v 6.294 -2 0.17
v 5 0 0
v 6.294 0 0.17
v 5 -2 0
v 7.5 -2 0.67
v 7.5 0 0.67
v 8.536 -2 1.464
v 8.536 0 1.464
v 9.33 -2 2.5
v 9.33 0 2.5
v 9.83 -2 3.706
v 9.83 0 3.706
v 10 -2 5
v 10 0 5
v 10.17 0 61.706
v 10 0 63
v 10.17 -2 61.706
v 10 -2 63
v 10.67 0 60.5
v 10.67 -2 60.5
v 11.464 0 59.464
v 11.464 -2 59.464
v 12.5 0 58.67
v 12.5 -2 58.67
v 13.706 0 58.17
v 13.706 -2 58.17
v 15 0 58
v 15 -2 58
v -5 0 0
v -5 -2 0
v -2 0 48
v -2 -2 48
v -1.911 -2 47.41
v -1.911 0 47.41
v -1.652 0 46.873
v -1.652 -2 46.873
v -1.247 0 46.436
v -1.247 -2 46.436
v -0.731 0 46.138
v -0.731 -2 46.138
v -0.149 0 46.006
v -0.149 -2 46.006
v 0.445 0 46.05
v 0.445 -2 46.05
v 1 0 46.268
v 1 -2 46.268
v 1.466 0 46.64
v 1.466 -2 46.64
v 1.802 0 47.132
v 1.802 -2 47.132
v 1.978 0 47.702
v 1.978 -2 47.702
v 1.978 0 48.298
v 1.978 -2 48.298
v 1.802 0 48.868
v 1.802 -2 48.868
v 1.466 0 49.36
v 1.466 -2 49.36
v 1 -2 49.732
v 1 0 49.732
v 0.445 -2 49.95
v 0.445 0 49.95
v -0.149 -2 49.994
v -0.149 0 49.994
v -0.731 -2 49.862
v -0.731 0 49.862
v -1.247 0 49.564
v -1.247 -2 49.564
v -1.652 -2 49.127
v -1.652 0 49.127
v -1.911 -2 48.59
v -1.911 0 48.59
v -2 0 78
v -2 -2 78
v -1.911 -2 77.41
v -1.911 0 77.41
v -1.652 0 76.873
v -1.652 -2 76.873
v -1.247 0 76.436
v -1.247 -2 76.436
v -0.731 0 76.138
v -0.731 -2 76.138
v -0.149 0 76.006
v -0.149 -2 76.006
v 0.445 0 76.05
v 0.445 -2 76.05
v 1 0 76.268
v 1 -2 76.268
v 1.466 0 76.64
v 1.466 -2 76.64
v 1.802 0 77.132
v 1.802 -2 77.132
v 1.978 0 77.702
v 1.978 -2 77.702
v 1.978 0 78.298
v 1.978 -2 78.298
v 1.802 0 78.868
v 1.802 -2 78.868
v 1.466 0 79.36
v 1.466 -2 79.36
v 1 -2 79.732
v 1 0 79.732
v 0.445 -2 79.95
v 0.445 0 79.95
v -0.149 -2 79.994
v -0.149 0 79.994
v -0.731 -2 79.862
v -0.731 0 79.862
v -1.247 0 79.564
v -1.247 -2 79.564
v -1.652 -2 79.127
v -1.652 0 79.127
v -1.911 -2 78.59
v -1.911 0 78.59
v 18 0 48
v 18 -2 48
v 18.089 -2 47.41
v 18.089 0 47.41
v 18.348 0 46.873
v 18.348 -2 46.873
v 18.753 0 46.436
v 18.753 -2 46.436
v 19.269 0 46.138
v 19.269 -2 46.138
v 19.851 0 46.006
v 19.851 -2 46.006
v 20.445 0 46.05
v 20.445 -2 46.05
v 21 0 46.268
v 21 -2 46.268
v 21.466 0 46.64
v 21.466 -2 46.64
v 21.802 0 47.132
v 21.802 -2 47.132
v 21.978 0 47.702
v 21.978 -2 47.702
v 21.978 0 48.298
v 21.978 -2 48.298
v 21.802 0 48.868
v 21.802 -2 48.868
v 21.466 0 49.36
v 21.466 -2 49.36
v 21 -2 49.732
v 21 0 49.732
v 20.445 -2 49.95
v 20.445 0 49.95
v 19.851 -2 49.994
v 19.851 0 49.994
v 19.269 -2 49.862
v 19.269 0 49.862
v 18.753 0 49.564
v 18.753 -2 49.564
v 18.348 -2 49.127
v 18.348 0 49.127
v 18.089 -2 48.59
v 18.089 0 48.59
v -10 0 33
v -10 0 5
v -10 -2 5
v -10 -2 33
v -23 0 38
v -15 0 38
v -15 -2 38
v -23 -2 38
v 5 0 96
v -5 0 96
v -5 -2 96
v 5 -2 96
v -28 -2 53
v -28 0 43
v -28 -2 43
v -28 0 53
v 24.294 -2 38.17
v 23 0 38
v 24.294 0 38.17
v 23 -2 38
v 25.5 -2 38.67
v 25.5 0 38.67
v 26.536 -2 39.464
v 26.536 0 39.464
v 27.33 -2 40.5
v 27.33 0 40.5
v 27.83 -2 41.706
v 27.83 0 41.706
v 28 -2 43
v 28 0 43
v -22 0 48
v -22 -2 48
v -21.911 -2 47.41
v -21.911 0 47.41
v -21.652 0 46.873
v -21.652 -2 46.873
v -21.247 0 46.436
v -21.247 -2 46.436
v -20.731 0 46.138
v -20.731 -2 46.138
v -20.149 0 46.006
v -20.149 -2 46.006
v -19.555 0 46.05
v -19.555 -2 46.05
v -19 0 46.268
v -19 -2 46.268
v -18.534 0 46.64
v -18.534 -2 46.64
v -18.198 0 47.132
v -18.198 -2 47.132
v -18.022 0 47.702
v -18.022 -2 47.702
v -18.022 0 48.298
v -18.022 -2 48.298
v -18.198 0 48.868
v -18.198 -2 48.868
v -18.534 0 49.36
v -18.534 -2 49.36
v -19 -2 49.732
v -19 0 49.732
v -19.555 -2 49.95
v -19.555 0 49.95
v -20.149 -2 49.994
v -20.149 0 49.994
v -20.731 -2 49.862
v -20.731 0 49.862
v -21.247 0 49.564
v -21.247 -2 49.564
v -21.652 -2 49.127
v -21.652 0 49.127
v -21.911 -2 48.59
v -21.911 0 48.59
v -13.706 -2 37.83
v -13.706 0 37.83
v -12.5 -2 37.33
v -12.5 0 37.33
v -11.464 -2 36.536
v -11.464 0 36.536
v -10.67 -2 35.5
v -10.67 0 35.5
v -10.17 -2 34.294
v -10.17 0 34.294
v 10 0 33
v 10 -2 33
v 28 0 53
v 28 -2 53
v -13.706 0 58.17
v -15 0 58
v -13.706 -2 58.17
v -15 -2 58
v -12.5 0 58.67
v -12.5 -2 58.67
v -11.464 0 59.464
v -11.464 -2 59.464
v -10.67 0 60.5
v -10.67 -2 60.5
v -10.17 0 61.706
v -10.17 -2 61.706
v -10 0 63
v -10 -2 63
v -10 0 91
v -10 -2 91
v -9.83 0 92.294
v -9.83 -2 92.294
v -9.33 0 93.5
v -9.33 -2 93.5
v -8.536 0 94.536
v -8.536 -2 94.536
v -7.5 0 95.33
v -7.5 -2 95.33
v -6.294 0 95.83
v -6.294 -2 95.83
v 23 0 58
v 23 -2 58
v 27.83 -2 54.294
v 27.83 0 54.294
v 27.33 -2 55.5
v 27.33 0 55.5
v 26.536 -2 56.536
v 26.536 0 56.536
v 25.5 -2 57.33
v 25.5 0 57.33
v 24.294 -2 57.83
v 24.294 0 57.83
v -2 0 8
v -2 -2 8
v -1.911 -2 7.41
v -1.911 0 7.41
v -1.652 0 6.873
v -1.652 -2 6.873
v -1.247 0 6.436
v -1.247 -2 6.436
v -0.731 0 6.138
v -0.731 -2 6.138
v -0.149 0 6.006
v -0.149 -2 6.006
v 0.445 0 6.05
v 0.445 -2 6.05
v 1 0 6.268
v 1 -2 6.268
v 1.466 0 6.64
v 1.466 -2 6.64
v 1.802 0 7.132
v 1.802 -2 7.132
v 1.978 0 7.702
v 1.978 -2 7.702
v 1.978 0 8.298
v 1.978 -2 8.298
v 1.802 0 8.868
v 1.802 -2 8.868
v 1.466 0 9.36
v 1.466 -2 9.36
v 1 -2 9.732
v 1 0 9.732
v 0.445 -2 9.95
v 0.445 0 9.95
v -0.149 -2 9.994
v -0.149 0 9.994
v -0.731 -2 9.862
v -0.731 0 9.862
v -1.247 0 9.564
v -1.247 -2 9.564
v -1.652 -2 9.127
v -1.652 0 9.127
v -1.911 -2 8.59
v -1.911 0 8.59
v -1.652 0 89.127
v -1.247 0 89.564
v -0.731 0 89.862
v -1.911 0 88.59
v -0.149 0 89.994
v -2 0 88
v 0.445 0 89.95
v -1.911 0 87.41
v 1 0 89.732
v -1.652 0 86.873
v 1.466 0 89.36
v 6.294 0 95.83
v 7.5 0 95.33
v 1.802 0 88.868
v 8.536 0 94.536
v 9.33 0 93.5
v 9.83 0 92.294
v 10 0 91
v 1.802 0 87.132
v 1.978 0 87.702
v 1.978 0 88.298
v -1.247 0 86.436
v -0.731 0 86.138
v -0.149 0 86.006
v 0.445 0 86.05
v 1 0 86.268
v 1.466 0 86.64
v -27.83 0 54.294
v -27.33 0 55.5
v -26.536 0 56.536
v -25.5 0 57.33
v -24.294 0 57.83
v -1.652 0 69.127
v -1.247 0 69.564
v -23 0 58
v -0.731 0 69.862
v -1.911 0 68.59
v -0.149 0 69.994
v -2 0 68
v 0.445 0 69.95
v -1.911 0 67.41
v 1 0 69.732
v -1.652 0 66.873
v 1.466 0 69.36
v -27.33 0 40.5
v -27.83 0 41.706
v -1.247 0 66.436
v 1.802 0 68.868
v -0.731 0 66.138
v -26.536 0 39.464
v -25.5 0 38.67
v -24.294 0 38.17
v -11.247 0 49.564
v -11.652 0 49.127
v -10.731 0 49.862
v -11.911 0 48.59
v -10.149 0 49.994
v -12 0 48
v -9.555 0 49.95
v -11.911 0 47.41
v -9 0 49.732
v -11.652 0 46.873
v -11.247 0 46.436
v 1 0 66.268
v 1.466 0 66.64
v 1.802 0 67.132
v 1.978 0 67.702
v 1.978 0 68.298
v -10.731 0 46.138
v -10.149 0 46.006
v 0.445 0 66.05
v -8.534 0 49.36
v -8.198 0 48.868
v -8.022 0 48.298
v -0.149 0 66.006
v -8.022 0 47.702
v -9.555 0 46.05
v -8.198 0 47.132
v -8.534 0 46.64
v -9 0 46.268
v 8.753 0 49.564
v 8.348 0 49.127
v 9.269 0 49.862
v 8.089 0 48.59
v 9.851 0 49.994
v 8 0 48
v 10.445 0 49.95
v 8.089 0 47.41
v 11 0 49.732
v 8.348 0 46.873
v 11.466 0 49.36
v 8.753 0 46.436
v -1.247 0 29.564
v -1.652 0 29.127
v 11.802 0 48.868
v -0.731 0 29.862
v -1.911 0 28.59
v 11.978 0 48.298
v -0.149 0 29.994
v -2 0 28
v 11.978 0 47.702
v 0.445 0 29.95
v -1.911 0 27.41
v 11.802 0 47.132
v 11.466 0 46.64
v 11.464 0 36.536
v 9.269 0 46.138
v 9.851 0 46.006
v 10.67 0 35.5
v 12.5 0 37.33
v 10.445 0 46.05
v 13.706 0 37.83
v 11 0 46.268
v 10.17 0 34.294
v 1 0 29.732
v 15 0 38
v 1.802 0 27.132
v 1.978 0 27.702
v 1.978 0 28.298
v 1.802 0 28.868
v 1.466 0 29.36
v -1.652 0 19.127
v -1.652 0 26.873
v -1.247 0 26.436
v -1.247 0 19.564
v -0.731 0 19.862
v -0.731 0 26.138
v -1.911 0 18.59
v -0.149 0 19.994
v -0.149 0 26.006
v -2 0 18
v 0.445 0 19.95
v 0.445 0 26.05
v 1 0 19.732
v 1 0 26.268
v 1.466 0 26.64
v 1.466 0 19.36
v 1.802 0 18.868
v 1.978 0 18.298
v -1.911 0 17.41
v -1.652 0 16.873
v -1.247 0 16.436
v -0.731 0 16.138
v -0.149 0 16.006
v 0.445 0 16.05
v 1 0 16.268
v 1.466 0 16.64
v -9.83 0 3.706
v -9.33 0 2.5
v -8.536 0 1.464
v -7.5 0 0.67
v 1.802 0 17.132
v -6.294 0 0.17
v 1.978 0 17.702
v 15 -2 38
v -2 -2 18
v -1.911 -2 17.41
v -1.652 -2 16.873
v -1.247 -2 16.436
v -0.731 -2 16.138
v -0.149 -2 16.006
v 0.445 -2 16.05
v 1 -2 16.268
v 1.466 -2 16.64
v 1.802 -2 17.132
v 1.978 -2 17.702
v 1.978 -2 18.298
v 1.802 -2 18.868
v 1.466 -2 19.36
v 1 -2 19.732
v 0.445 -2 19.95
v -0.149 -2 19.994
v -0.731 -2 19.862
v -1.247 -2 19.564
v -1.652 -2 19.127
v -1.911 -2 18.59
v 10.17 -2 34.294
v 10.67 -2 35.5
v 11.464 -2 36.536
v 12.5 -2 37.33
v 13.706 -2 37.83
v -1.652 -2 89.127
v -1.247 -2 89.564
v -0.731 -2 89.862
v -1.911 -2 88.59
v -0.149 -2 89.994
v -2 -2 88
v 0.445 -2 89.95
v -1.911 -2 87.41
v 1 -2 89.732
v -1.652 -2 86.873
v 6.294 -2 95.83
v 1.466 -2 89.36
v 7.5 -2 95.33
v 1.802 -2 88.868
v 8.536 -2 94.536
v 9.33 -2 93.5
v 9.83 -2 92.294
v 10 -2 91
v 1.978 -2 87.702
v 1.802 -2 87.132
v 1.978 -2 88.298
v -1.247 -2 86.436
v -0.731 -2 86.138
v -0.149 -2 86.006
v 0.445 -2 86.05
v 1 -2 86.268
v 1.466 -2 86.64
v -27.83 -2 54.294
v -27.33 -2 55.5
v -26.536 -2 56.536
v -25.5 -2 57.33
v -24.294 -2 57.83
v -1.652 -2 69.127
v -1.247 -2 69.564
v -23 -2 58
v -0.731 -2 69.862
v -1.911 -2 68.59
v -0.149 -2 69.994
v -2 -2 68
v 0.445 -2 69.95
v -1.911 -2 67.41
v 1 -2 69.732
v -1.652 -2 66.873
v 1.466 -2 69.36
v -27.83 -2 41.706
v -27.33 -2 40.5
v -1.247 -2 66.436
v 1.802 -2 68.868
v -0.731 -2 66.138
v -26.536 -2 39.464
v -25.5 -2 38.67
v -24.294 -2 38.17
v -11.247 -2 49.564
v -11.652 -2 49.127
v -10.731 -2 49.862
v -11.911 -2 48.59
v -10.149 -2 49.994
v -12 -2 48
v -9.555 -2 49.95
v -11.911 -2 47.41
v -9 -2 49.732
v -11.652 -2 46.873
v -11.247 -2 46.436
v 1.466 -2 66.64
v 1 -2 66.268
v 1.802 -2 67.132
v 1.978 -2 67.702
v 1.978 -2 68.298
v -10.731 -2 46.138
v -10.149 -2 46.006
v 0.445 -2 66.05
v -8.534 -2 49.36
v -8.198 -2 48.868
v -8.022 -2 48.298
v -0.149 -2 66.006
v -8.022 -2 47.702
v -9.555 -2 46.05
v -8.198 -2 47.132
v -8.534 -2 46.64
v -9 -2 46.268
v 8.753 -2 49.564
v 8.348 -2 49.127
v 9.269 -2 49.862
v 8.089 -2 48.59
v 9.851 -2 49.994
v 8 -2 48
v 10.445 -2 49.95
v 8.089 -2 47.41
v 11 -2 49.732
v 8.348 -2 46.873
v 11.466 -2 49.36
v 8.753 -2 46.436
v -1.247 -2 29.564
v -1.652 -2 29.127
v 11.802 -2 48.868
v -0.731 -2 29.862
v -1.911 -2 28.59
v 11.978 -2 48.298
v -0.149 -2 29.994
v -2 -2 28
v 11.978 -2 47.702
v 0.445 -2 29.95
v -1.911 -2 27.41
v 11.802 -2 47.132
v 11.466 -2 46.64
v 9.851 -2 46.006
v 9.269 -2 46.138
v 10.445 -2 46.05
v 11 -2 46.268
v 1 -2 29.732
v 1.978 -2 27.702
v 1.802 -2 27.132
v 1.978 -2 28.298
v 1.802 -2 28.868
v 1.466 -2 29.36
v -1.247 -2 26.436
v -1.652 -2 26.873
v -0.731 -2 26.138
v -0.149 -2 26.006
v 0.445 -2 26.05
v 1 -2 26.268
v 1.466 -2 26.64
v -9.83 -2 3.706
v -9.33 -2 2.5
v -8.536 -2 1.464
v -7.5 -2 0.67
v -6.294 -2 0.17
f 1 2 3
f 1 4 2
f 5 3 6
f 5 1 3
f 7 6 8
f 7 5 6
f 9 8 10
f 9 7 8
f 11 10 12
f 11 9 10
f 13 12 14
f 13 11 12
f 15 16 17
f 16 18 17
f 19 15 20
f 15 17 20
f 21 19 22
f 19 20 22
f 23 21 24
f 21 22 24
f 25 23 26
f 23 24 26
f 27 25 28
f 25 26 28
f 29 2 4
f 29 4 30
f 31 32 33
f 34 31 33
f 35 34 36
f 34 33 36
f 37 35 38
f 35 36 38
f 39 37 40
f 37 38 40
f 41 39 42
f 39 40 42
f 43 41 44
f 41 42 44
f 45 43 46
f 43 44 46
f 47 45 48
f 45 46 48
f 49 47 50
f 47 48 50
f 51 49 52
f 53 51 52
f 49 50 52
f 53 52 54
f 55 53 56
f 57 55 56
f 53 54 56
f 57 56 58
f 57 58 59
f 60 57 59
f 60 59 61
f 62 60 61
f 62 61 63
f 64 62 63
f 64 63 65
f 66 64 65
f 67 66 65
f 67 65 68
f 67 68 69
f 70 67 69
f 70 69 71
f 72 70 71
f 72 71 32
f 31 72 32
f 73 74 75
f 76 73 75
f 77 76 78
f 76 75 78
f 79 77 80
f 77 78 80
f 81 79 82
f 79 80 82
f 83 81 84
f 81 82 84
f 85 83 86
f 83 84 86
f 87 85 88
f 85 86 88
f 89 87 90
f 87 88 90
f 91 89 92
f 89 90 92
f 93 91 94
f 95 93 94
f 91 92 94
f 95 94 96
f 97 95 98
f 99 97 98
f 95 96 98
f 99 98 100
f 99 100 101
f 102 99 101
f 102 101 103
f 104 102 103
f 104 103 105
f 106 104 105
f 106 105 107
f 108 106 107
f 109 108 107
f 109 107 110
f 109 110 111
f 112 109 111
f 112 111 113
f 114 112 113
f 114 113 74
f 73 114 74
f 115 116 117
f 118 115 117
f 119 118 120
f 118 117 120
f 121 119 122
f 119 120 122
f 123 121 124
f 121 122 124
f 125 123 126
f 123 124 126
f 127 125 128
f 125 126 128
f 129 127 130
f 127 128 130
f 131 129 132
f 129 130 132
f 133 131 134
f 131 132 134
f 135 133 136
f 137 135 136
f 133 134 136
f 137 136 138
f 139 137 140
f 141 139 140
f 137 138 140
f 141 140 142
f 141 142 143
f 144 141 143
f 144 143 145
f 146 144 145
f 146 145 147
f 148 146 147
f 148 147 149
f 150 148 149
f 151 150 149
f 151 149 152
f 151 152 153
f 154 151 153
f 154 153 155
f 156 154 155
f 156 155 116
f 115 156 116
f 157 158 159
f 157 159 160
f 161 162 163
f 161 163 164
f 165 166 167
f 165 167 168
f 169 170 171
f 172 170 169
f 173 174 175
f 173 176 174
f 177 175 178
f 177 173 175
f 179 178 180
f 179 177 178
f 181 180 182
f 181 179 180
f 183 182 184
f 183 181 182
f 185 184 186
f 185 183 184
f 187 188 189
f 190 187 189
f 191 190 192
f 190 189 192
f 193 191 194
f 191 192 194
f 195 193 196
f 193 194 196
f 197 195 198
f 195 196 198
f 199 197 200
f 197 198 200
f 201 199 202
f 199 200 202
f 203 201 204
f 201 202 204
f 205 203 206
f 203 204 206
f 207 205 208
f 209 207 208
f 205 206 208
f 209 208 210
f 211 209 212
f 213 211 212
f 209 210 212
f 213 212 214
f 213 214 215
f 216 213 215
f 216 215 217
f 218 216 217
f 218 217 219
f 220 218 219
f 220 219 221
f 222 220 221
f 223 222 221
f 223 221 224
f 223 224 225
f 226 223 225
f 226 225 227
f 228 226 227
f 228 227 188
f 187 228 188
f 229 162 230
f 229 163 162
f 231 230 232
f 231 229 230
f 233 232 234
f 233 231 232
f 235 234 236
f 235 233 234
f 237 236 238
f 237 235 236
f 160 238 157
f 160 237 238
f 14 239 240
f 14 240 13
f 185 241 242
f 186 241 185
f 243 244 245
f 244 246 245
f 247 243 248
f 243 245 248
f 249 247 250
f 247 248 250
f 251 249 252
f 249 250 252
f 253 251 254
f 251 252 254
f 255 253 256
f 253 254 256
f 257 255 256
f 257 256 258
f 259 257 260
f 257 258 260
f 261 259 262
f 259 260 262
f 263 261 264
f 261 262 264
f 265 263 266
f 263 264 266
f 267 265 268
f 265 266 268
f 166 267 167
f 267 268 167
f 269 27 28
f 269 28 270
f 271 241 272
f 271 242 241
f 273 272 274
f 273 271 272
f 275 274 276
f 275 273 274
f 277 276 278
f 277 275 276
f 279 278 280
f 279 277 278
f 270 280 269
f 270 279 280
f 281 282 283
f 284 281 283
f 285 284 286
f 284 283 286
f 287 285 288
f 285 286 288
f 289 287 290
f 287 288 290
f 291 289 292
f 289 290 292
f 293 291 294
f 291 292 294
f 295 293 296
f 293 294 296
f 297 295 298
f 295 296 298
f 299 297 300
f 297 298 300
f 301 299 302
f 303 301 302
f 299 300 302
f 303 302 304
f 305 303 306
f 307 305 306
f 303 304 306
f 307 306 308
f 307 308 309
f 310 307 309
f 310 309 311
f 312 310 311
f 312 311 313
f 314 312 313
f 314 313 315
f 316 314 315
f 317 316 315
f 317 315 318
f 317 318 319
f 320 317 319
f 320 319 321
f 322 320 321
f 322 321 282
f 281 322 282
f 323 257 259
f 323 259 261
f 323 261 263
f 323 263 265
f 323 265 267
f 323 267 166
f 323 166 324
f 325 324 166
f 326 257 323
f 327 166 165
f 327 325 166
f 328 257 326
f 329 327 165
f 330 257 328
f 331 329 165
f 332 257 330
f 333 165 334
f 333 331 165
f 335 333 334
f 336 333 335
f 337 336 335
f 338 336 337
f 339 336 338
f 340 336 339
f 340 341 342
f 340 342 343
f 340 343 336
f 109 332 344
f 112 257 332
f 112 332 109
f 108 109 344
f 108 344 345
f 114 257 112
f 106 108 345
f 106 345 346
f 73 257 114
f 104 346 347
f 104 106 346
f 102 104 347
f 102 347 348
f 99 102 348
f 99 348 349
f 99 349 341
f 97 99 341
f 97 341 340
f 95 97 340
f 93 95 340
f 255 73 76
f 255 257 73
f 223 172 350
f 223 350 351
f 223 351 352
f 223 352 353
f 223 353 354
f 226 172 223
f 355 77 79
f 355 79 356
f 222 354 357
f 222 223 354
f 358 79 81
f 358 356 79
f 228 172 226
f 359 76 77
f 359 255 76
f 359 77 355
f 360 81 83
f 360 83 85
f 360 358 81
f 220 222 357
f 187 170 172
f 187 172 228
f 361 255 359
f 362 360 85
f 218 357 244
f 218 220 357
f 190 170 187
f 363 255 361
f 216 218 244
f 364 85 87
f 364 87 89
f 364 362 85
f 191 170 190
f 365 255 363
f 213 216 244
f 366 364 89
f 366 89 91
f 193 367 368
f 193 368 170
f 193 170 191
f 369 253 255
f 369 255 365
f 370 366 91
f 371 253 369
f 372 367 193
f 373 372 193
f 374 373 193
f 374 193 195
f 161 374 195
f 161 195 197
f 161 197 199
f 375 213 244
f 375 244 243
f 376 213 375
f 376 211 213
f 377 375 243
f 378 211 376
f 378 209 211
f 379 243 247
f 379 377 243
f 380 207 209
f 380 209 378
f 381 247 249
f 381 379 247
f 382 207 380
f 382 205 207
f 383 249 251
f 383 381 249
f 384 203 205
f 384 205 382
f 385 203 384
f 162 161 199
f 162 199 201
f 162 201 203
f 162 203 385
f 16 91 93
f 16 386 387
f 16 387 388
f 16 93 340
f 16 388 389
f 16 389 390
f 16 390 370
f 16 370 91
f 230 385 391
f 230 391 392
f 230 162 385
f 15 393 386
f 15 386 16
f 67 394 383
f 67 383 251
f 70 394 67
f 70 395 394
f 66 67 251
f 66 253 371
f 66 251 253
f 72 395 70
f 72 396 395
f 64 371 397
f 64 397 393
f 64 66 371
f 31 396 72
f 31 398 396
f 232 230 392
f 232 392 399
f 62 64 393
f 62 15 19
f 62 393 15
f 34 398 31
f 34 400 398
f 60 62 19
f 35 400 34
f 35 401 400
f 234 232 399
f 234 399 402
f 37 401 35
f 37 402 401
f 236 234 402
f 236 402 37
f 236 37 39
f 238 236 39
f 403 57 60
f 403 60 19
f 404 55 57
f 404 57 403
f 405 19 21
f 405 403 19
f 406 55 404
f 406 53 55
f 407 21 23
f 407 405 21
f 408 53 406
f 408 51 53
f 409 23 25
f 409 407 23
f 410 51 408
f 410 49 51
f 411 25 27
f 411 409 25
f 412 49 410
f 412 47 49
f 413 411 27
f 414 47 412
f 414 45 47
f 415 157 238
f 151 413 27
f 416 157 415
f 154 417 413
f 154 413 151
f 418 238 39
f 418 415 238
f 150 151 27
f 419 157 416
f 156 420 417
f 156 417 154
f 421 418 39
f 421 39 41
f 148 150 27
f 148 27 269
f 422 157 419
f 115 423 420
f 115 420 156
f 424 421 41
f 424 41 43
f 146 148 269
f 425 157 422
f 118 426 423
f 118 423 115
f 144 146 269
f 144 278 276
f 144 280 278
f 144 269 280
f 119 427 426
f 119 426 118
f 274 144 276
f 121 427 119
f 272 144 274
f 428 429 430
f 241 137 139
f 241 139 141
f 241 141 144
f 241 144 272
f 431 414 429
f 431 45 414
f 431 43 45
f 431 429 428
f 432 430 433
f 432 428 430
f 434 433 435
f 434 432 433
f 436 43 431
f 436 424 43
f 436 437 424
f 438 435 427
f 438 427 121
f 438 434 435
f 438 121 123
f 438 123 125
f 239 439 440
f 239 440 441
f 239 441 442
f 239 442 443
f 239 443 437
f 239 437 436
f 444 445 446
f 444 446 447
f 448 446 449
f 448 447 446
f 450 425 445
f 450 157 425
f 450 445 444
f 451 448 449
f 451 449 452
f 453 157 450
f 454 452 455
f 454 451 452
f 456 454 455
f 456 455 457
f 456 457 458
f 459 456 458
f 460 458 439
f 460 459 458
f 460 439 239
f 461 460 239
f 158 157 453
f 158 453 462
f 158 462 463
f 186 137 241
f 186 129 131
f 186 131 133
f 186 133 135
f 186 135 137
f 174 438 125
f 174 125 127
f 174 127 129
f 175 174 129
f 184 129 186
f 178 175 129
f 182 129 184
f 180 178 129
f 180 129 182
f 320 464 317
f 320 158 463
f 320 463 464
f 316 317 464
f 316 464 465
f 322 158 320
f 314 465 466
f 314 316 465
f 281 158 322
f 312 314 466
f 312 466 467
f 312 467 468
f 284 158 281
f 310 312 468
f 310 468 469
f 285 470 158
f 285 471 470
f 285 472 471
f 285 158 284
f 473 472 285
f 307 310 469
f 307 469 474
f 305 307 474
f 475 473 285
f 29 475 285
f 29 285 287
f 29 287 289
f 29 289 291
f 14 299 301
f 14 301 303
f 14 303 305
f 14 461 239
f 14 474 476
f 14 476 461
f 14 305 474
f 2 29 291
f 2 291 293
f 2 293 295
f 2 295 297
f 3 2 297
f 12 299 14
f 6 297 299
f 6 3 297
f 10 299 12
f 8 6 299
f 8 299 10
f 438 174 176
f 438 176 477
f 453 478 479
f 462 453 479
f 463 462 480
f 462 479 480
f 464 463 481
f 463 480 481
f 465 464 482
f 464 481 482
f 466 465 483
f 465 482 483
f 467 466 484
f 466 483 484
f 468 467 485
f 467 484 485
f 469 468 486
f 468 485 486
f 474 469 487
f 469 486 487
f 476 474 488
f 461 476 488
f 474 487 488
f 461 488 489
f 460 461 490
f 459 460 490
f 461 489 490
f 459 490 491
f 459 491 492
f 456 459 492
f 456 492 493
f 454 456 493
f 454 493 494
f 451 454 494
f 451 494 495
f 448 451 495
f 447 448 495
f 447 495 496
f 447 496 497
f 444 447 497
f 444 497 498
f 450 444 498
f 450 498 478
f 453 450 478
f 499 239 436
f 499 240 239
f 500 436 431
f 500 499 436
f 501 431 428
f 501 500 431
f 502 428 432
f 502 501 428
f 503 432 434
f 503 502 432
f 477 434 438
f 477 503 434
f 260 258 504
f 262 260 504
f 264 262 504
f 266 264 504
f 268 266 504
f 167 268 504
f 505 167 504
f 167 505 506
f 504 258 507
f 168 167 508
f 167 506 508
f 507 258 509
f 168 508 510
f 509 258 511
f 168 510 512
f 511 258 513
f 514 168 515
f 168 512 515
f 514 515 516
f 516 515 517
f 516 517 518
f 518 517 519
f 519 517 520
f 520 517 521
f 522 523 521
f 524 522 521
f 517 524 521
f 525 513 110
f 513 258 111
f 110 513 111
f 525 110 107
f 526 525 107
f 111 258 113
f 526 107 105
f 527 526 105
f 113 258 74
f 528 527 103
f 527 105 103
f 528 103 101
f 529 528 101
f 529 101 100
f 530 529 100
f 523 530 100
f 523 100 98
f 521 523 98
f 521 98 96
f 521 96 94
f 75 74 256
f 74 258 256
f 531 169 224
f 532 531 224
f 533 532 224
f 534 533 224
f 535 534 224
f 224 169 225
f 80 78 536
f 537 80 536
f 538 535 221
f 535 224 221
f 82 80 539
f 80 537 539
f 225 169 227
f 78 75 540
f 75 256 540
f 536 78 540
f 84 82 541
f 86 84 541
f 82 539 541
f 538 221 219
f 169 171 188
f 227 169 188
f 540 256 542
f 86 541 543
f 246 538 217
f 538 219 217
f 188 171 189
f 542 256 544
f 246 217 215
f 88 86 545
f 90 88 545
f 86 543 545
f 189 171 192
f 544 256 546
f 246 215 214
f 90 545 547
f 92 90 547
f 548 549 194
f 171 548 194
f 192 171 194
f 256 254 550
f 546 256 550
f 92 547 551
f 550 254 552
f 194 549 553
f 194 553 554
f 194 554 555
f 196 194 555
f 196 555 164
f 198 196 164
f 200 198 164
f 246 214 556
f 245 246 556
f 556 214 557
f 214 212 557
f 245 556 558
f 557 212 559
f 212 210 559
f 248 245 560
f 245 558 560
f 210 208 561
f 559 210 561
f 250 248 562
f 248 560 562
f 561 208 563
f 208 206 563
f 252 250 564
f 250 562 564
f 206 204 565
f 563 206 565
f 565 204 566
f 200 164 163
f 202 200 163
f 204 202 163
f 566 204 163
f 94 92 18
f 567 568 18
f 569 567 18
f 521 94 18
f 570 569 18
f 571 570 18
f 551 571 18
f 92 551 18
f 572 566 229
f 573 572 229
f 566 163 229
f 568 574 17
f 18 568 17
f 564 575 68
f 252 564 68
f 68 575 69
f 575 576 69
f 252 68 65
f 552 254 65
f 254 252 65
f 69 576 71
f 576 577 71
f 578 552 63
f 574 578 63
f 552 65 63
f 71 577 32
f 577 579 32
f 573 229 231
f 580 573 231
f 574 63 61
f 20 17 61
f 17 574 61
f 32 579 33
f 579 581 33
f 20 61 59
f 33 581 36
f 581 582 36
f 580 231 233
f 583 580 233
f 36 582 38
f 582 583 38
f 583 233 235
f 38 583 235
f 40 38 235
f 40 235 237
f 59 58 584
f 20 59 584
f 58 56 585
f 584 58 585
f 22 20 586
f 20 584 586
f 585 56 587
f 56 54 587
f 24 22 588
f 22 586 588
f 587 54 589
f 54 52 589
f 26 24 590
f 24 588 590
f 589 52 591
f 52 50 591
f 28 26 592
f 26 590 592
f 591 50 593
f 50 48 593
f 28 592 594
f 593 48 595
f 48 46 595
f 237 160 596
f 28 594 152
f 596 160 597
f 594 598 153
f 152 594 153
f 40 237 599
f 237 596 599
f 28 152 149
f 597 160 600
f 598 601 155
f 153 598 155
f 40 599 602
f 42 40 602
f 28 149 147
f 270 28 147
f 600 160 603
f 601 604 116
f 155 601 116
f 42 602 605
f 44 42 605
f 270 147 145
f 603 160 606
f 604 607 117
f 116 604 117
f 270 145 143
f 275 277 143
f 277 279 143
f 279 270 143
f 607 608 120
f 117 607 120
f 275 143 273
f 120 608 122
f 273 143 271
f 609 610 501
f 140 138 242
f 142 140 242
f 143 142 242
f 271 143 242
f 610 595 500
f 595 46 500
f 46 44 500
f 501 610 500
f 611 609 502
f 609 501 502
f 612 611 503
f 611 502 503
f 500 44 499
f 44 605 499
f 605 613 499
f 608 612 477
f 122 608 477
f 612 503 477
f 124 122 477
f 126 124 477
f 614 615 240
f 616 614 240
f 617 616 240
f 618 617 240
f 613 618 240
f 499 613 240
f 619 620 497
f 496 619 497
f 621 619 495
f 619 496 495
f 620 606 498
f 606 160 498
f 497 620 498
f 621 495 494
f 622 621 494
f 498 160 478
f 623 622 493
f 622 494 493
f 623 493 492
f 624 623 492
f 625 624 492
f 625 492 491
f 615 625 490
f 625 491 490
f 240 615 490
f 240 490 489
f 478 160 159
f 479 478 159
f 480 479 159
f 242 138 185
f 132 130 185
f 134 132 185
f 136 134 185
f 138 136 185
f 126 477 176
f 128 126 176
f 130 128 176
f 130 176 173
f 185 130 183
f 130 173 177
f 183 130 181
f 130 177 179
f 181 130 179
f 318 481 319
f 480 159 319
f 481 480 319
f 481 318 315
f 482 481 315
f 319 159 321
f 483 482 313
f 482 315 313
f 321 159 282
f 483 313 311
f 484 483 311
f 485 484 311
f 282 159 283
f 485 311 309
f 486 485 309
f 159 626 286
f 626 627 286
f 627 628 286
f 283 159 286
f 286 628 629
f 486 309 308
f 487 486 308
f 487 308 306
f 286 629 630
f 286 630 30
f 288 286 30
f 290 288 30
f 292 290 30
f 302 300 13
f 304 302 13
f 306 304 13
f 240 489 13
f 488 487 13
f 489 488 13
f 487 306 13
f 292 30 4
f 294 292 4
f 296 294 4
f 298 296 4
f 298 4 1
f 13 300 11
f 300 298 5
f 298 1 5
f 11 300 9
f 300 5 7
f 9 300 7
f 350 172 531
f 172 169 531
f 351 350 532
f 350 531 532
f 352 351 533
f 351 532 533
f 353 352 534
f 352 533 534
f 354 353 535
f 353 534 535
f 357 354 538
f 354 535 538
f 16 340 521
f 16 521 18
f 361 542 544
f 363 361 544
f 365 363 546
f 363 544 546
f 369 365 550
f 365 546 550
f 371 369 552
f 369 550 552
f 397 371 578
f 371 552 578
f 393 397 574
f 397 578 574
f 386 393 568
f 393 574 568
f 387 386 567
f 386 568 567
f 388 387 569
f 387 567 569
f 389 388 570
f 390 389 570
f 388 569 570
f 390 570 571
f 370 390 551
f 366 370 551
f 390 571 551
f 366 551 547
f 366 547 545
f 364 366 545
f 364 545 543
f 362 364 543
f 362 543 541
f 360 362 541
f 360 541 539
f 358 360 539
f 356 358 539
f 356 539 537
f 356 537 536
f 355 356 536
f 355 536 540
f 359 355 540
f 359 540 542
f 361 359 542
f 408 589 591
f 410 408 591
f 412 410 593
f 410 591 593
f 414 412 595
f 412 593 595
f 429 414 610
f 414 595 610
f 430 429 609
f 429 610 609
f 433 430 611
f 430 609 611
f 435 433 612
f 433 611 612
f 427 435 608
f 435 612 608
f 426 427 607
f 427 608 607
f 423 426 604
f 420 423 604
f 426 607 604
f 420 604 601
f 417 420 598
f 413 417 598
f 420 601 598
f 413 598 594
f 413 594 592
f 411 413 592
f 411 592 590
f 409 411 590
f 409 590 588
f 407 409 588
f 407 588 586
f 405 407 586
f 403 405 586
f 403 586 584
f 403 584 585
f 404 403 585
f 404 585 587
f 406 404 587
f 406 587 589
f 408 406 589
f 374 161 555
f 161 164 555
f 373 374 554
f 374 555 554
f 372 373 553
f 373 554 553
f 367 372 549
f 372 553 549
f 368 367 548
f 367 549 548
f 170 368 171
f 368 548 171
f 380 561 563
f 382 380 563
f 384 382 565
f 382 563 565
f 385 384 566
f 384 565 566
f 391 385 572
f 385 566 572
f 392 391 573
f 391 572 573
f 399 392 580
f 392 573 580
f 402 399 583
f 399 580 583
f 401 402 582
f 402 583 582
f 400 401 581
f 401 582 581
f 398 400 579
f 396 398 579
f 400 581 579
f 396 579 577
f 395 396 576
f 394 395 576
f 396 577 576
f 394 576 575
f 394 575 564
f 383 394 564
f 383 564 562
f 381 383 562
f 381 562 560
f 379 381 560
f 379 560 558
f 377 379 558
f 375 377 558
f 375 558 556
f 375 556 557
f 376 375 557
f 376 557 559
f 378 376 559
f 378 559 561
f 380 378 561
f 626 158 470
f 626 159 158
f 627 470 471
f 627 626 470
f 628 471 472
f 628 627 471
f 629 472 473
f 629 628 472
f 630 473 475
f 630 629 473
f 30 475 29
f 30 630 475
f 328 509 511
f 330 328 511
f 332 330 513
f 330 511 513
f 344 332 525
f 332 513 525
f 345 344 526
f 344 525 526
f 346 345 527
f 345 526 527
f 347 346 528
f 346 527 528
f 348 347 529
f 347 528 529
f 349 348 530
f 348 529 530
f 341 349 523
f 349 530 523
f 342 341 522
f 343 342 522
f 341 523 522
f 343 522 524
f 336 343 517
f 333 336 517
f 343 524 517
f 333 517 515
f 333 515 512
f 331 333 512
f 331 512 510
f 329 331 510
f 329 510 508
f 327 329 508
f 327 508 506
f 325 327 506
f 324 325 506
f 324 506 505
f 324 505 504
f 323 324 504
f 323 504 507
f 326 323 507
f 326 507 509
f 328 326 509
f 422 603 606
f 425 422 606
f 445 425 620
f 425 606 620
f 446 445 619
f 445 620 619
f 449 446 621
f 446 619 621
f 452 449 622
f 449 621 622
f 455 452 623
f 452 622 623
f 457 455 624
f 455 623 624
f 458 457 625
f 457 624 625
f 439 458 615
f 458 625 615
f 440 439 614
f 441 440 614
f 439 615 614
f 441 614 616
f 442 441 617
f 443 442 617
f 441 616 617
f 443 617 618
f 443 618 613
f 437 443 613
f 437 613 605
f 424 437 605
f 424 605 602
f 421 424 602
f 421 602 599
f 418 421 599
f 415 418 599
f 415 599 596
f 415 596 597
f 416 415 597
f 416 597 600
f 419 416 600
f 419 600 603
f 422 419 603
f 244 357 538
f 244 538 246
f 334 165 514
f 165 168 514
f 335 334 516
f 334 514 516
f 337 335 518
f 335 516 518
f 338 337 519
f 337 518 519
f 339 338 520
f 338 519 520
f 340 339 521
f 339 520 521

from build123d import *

# Parameters (mm, degrees)
EXTRUDE_1_DEPTH       = 2
HOLE_WIZARD_4_0_4_1_D = 4
HOLE_WIZARD_4_0_4_2_D = 4
FILLET_1_R            = 5
FILLET_2_R            = 5


with BuildPart() as part:
    # 草圖1 → 填料-伸長1 (new body)
    with BuildSketch(Plane(origin=(0, 0, 0), x_dir=(1, 0, 0), z_dir=(0, 1, 0))):
        Polygon((-28, -38), (-28, -58), (-10, -58), (-10, -96), (10, -96), (10, -58), (28, -58), (28, -38), (10, -38), (10, 0), (-10, 0), (-10, -38), align=None)
    extrude(amount=-EXTRUDE_1_DEPTH)

    # Ø4.0 (4) 直徑孔1 (through all)
    with Locations(Plane(origin=(0, 0, 0), x_dir=(1, 0, 0), z_dir=(0, 1, 0))):
        with Locations((0, -28), (0, -48), (0, -68), (0, -88), (-20, -48), (20, -48), (0, -8)):
            Hole(HOLE_WIZARD_4_0_4_1_D / 2)

    # Ø4.0 (4) 直徑孔2 (through all)
    with Locations(Plane(origin=(0, 0, 0), x_dir=(1, 0, 0), z_dir=(0, 1, 0))):
        with Locations((0, -18), (10, -48), (-10, -48), (0, -78)):
            Hole(HOLE_WIZARD_4_0_4_2_D / 2)

    # 圓角1
    fillet_1_edges = [part.edges().sort_by_distance(p)[0] for p in [
        (10, -1, 38),
        (10, -1, 58),
        (-10, -1, 58),
        (-10, -1, 38),
    ]]
    fillet(fillet_1_edges, radius=FILLET_1_R)

    # 圓角2
    fillet_2_edges = [part.edges().sort_by_distance(p)[0] for p in [
        (10, -1, 0),
        (28, -1, 38),
        (28, -1, 58),
        (10, -1, 96),
        (-10, -1, 96),
        (-28, -1, 58),
        (-28, -1, 38),
        (-10, -1, 0),
    ]]
    fillet(fillet_2_edges, radius=FILLET_2_R)


solid = part.part
